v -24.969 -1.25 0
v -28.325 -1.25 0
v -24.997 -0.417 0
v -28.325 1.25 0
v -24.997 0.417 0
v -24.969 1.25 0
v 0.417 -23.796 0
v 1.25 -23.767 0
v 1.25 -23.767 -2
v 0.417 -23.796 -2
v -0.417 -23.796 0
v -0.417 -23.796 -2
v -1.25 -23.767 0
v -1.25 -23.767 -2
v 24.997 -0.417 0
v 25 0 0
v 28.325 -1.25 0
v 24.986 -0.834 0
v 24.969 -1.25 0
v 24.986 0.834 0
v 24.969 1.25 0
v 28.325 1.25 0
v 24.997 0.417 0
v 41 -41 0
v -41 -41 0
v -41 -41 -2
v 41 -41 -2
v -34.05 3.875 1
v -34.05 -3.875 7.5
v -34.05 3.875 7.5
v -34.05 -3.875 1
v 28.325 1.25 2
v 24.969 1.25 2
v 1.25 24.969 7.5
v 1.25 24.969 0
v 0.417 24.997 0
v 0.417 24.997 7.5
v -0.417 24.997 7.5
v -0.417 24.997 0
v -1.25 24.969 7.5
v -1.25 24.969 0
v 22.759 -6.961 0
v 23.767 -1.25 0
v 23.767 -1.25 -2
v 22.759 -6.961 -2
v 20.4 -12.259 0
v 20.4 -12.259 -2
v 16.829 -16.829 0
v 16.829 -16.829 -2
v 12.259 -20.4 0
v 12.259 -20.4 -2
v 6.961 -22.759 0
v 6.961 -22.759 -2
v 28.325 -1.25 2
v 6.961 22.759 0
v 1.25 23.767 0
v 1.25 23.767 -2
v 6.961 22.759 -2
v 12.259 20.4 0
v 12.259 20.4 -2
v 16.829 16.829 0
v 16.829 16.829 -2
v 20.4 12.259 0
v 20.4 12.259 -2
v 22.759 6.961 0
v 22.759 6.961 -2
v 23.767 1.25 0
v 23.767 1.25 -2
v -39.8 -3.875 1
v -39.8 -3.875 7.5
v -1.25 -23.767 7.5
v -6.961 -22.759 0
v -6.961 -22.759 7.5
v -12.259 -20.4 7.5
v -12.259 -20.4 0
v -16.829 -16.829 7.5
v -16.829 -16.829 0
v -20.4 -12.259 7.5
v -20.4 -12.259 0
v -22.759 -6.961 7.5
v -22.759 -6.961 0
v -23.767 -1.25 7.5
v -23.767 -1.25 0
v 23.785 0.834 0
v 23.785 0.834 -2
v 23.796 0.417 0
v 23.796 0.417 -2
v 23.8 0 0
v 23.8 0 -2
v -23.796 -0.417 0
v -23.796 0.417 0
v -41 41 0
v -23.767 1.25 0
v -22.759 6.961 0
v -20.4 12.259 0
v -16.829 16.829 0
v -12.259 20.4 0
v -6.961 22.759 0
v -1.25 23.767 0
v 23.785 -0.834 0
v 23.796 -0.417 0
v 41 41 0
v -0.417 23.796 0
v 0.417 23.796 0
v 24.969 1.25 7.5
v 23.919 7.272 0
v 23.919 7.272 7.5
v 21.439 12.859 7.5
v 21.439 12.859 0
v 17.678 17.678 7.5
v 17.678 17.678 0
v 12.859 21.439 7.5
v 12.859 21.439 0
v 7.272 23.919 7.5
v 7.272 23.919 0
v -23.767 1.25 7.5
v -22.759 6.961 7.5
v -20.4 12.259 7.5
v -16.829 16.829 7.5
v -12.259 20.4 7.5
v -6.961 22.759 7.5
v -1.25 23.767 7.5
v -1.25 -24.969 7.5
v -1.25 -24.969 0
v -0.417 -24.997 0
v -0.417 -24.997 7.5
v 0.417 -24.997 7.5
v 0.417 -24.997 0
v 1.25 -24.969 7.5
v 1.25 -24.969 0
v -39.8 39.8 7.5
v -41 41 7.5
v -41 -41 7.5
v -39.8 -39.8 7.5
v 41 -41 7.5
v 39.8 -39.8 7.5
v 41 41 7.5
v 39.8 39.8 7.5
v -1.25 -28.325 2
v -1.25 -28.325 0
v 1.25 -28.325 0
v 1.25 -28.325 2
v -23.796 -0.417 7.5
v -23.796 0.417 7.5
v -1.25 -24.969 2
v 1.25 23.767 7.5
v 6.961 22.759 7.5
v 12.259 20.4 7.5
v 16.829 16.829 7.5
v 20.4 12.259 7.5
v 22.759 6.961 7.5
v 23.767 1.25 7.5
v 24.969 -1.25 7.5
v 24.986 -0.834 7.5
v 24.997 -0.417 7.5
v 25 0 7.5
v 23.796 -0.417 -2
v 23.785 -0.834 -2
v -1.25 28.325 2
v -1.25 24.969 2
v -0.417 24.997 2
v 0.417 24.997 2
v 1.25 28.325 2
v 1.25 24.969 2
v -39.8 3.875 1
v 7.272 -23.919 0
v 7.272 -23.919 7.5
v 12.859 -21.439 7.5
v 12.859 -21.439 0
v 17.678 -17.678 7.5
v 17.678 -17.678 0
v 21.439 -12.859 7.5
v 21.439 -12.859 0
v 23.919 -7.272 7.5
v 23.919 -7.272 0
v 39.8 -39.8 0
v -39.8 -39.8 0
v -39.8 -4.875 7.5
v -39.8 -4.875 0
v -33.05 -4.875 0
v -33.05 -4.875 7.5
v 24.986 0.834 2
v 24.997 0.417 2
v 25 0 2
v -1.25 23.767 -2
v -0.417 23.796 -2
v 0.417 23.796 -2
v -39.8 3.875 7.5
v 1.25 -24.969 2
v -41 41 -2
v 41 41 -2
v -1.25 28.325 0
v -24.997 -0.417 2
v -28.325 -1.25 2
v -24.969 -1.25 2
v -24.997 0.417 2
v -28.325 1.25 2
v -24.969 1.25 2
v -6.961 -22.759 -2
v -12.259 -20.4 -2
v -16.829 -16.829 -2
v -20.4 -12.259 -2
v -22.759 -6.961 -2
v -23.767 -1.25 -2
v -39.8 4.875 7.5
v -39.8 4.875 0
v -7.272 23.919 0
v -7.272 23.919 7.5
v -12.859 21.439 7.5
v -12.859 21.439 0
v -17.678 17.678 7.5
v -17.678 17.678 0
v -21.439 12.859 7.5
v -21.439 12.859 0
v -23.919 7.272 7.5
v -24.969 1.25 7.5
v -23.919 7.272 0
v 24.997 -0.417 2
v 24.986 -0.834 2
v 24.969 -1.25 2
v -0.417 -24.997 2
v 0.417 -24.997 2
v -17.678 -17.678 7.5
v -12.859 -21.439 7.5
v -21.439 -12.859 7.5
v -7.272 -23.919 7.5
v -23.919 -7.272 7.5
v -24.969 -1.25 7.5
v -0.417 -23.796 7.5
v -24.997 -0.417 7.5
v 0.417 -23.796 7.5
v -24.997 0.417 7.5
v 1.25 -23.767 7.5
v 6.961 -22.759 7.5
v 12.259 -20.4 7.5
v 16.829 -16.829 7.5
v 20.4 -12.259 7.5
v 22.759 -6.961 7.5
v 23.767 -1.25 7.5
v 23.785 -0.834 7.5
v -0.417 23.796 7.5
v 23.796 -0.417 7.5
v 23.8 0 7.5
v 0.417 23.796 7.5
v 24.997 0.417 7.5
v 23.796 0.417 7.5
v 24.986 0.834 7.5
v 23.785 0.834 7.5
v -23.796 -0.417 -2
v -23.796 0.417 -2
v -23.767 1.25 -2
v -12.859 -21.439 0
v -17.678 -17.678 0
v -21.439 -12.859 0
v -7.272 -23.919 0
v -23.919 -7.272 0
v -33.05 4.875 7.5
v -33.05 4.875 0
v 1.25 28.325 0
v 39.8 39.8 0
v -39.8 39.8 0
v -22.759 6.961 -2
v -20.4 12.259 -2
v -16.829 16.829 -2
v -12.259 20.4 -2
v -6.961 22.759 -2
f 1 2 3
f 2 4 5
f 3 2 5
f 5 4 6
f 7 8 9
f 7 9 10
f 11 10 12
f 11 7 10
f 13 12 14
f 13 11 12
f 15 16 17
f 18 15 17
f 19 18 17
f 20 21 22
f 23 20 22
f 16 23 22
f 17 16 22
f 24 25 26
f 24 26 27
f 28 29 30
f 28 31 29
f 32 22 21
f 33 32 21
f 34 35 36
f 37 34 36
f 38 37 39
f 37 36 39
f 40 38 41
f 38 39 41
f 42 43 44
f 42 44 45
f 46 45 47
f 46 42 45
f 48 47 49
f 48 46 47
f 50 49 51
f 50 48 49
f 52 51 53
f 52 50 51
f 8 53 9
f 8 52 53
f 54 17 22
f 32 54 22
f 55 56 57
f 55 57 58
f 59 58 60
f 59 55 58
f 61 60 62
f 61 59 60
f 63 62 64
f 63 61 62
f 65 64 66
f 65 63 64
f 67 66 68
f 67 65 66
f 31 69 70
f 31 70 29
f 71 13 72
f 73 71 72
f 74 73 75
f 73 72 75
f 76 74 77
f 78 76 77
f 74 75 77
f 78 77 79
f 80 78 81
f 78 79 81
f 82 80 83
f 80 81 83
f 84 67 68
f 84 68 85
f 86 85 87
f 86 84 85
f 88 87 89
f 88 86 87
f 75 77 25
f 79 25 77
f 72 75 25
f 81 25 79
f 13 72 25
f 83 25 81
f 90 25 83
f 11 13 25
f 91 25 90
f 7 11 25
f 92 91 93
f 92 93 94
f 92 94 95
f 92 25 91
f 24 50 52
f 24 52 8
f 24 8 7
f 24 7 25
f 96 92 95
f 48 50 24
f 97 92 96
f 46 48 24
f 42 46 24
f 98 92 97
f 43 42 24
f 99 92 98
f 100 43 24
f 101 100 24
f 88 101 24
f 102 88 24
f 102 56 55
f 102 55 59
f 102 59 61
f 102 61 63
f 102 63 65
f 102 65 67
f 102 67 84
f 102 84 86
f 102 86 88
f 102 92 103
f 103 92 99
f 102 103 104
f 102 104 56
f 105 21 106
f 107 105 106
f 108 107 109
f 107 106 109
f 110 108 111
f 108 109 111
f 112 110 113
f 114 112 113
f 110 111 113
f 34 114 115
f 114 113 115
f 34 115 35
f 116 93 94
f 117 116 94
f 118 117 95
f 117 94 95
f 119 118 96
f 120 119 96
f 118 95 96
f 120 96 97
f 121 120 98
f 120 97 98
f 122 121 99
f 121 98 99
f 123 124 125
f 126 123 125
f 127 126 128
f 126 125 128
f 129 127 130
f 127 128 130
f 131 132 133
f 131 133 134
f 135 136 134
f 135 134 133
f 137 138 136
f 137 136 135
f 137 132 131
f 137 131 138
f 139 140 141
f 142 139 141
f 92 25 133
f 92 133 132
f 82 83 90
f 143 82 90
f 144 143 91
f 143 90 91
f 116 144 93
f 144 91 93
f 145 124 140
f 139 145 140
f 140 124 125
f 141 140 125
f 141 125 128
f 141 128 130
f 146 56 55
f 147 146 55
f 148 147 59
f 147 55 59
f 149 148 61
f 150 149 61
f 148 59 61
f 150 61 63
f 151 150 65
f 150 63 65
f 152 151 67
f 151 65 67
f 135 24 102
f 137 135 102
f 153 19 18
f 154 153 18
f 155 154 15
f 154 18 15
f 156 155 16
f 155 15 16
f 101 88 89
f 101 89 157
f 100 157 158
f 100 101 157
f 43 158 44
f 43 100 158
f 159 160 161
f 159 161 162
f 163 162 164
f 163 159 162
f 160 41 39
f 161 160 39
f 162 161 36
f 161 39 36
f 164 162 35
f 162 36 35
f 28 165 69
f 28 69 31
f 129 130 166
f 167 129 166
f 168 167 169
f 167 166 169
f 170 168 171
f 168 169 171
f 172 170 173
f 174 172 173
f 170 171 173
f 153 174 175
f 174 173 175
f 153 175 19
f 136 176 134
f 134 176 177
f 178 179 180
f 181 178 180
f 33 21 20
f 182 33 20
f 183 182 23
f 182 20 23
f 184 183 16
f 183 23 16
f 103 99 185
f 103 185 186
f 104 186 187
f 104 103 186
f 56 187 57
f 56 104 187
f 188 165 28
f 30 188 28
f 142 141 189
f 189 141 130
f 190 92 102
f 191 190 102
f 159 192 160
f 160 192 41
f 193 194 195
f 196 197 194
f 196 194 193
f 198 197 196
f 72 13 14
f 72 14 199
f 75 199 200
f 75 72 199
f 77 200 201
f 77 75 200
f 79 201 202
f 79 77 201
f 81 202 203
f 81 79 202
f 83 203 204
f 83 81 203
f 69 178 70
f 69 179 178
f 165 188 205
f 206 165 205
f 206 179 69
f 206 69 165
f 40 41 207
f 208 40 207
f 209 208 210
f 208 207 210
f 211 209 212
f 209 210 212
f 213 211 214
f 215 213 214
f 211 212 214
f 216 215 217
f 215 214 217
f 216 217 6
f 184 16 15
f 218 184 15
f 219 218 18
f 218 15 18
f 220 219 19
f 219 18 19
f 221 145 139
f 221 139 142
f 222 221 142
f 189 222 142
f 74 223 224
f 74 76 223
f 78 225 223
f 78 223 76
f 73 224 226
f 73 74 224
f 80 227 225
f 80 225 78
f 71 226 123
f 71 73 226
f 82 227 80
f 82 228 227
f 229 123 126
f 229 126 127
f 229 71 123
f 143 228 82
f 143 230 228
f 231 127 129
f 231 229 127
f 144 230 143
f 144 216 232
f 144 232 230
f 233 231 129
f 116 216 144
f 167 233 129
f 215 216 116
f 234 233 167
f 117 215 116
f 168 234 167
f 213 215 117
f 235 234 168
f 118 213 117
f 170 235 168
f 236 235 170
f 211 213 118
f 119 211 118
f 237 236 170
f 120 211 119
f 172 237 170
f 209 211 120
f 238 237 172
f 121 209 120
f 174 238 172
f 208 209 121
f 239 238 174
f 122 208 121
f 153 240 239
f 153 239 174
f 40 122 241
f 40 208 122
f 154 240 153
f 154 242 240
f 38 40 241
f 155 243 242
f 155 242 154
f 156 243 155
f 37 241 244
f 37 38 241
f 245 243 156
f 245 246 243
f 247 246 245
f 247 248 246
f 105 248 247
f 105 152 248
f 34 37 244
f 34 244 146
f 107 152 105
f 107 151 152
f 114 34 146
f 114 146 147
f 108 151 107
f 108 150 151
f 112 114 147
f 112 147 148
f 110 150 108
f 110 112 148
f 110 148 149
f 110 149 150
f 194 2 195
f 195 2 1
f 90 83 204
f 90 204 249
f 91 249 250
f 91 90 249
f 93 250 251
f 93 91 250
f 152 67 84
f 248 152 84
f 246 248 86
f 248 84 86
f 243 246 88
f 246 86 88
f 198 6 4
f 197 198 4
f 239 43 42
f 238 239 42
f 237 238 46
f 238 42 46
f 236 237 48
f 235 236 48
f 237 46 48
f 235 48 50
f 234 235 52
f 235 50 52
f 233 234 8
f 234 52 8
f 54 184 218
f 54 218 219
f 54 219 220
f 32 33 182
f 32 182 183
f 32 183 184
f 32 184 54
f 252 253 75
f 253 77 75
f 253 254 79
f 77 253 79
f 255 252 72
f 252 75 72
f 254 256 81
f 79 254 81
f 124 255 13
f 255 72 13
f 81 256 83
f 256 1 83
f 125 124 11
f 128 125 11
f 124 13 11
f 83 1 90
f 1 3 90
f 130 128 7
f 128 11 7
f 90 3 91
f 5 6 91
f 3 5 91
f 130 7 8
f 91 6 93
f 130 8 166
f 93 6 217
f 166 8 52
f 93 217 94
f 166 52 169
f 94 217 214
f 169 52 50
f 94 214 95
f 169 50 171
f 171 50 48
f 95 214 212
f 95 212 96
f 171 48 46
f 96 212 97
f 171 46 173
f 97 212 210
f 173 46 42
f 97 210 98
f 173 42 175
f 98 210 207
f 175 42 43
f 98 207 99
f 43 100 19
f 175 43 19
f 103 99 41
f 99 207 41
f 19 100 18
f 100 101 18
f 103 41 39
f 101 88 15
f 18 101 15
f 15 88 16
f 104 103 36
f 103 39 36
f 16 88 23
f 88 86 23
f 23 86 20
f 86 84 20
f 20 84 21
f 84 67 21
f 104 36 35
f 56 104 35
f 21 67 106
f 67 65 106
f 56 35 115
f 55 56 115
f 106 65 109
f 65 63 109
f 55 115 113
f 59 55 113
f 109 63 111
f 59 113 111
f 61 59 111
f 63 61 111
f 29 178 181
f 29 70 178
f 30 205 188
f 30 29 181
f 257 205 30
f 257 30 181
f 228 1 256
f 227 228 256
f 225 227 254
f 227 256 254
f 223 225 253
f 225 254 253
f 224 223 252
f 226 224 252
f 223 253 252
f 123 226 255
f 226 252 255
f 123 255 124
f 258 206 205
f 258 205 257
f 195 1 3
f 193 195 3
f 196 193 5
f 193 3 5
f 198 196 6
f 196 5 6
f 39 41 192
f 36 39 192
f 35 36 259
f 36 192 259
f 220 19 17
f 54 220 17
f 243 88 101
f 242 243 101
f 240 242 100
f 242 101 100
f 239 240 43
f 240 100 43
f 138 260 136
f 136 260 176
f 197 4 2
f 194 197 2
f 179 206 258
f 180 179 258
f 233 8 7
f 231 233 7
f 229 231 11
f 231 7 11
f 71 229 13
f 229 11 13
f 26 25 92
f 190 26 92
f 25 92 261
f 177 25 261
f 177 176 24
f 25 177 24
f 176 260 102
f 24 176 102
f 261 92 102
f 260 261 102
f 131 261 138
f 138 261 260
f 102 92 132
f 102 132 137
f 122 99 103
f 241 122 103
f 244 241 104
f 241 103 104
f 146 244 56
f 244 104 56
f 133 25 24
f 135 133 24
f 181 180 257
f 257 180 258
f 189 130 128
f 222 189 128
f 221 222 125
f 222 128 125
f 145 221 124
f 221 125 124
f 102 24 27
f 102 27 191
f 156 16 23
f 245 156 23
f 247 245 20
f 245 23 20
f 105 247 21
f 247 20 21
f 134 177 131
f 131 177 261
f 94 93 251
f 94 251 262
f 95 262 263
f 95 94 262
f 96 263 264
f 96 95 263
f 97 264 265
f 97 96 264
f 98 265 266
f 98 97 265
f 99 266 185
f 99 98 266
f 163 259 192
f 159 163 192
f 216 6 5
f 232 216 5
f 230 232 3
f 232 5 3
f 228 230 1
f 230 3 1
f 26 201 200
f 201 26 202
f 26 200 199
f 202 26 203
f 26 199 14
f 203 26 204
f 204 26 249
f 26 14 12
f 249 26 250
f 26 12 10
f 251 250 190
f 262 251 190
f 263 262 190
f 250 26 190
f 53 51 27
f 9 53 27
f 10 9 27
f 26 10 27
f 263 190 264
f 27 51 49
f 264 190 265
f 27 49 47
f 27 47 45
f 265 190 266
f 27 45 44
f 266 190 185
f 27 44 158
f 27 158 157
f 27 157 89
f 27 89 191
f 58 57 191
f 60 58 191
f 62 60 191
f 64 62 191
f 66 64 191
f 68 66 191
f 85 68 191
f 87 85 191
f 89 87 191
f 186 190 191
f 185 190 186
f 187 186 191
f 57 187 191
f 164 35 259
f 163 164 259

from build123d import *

# Parameters (mm, degrees)
F1_DEPTH = 7.5
F0_W     = 82
F0_H     = 82
F0_R     = 32.8
F0_W_2   = 6.75
F0_H_2   = 9.75
F2_DEPTH = 2
F3_DEPTH = 2
F4_DEPTH = 7.5
F5_T     = -1


# Not quite as in the source:
# - a feature names something its author has since deleted; it is built from what else it names


with BuildPart() as f1:
    # F0 (on Top) → F1 (new body)
    with BuildSketch(Plane.XY):
        with BuildLine():
            ThreePointArc((-24.9687304443, -1.25), (-17.6776695297, -17.6776695297), (-1.25, -24.9687304443))
            Line((-1.25, -24.9687304443), (-1.25, -23.7671517015))
            ThreePointArc((-1.25, -23.7671517015), (-16.8291413922, -16.8291413922), (-23.7671517015, -1.25))
            Line((-23.7671517015, -1.25), (-24.9687304443, -1.25))
        make_face()
        with BuildLine():
            Line((-1.25, 23.7671517015), (-1.25, 24.9687304443))
            ThreePointArc((-1.25, 24.9687304443), (-17.6776695297, 17.6776695297), (-24.9687304443, 1.25))
            Line((-24.9687304443, 1.25), (-23.7671517015, 1.25))
            ThreePointArc((-23.7671517015, 1.25), (-16.8291413922, 16.8291413922), (-1.25, 23.7671517015))
        make_face()
        with BuildLine():
            Line((23.7671517015, 1.25), (24.9687304443, 1.25))
            ThreePointArc((24.9687304443, 1.25), (17.6776695297, 17.6776695297), (1.25, 24.9687304443))
            Line((1.25, 24.9687304443), (1.25, 23.7671517015))
            ThreePointArc((1.25, 23.7671517015), (16.8291413922, 16.8291413922), (23.7671517015, 1.25))
        make_face()
        with BuildLine():
            ThreePointArc((1.25, -24.9687304443), (17.6776695297, -17.6776695297), (24.9687304443, -1.25))
            Line((24.9687304443, -1.25), (23.7671517015, -1.25))
            ThreePointArc((23.7671517015, -1.25), (16.8291413922, -16.8291413922), (1.25, -23.7671517015))
            Line((1.25, -23.7671517015), (1.25, -24.9687304443))
        make_face()
        with BuildLine():
            Line((1.25, 23.7671517015), (1.25, 24.9687304443))
            ThreePointArc((1.25, 24.9687304443), (0, 25), (-1.25, 24.9687304443))
            Line((-1.25, 24.9687304443), (-1.25, 23.7671517015))
            ThreePointArc((-1.25, 23.7671517015), (0, 23.8), (1.25, 23.7671517015))
        make_face()
        with BuildLine():
            ThreePointArc((-1.25, -24.9687304443), (0, -25), (1.25, -24.9687304443))
            Line((1.25, -24.9687304443), (1.25, -23.7671517015))
            ThreePointArc((1.25, -23.7671517015), (0, -23.8), (-1.25, -23.7671517015))
            Line((-1.25, -23.7671517015), (-1.25, -24.9687304443))
        make_face()
        with BuildLine():
            ThreePointArc((24.9687304443, -1.25), (24.9921813885, -0.6251955264), (25, 0))
            ThreePointArc((25, 0), (24.9921813885, 0.6251955264), (24.9687304443, 1.25))
            Line((24.9687304443, 1.25), (23.7671517015, 1.25))
            ThreePointArc((23.7671517015, 1.25), (23.7917865081, 0.6252157649), (23.8, 0))
            ThreePointArc((23.8, 0), (23.7917865081, -0.6252157649), (23.7671517015, -1.25))
            Line((23.7671517015, -1.25), (24.9687304443, -1.25))
        make_face()
        with BuildLine():
            Line((-23.7671517015, 1.25), (-24.9687304443, 1.25))
            ThreePointArc((-24.9687304443, 1.25), (-25, 0), (-24.9687304443, -1.25))
            Line((-24.9687304443, -1.25), (-23.7671517015, -1.25))
            ThreePointArc((-23.7671517015, -1.25), (-23.8, 0), (-23.7671517015, 1.25))
        make_face()
    extrude(amount=F1_DEPTH)


with BuildPart() as f1b:
    # F0 (on Top) → F1, piece 2 (new body)
    with BuildSketch(Plane.XY):
        Rectangle(F0_W, F0_H)
        Polygon((-39.8, 4.875), (-39.8, 39.8), (39.8, 39.8), (39.8, -39.8), (-39.8, -39.8), (-39.8, -4.875), align=None, mode=Mode.SUBTRACT)
    extrude(amount=F1_DEPTH)


with BuildPart() as f2:
    # F0 (on Top) → F2 (new body)
    with BuildSketch(Plane.XY):
        Rectangle(F0_W, F0_H)
        Polygon((-39.8, 4.875), (-39.8, 39.8), (39.8, 39.8), (39.8, -39.8), (-39.8, -39.8), (-39.8, -4.875), align=None, mode=Mode.SUBTRACT)
        Polygon((39.8, 39.8), (-39.8, 39.8), (-39.8, 4.875), (-33.05, 4.875), (-33.05, -4.875), (-39.8, -4.875), (-39.8, -39.8), (39.8, -39.8), align=None)
        Circle(F0_R, mode=Mode.SUBTRACT)
        Circle(F0_R)
        with BuildLine():
            ThreePointArc((1.25, 24.9687304443), (17.6776695297, 17.6776695297), (24.9687304443, 1.25))
            Line((24.9687304443, 1.25), (28.325, 1.25))
            Line((28.325, 1.25), (28.325, -1.25))
            Line((28.325, -1.25), (24.9687304443, -1.25))
            ThreePointArc((24.9687304443, -1.25), (17.6776695297, -17.6776695297), (1.25, -24.9687304443))
            Line((1.25, -24.9687304443), (1.25, -28.325))
            Line((1.25, -28.325), (-1.25, -28.325))
            Line((-1.25, -28.325), (-1.25, -24.9687304443))
            ThreePointArc((-1.25, -24.9687304443), (-17.6776695297, -17.6776695297), (-24.9687304443, -1.25))
            Line((-24.9687304443, -1.25), (-28.325, -1.25))
            Line((-28.325, -1.25), (-28.325, 1.25))
            Line((-28.325, 1.25), (-24.9687304443, 1.25))
            ThreePointArc((-24.9687304443, 1.25), (-17.6776695297, 17.6776695297), (-1.25, 24.9687304443))
            Line((-1.25, 24.9687304443), (-1.25, 28.325))
            Line((-1.25, 28.325), (1.25, 28.325))
            Line((1.25, 28.325), (1.25, 24.9687304443))
        make_face(mode=Mode.SUBTRACT)
        with Locations((-36.425, 0)):
            Rectangle(F0_W_2, F0_H_2)
        with BuildLine():
            Line((23.7671517015, 1.25), (24.9687304443, 1.25))
            ThreePointArc((24.9687304443, 1.25), (17.6776695297, 17.6776695297), (1.25, 24.9687304443))
            Line((1.25, 24.9687304443), (1.25, 23.7671517015))
            ThreePointArc((1.25, 23.7671517015), (16.8291413922, 16.8291413922), (23.7671517015, 1.25))
        make_face()
        with BuildLine():
            Line((-1.25, 23.7671517015), (-1.25, 24.9687304443))
            ThreePointArc((-1.25, 24.9687304443), (-17.6776695297, 17.6776695297), (-24.9687304443, 1.25))
            Line((-24.9687304443, 1.25), (-23.7671517015, 1.25))
            ThreePointArc((-23.7671517015, 1.25), (-16.8291413922, 16.8291413922), (-1.25, 23.7671517015))
        make_face()
        with BuildLine():
            ThreePointArc((-24.9687304443, -1.25), (-17.6776695297, -17.6776695297), (-1.25, -24.9687304443))
            Line((-1.25, -24.9687304443), (-1.25, -23.7671517015))
            ThreePointArc((-1.25, -23.7671517015), (-16.8291413922, -16.8291413922), (-23.7671517015, -1.25))
            Line((-23.7671517015, -1.25), (-24.9687304443, -1.25))
        make_face()
        with BuildLine():
            ThreePointArc((1.25, -24.9687304443), (17.6776695297, -17.6776695297), (24.9687304443, -1.25))
            Line((24.9687304443, -1.25), (23.7671517015, -1.25))
            ThreePointArc((23.7671517015, -1.25), (16.8291413922, -16.8291413922), (1.25, -23.7671517015))
            Line((1.25, -23.7671517015), (1.25, -24.9687304443))
        make_face()
        with BuildLine():
            ThreePointArc((-24.9687304443, -1.25), (-25, 0), (-24.9687304443, 1.25))
            Line((-24.9687304443, 1.25), (-28.325, 1.25))
            Line((-28.325, 1.25), (-28.325, -1.25))
            Line((-28.325, -1.25), (-24.9687304443, -1.25))
        make_face()
        with BuildLine():
            Line((1.25, -28.325), (1.25, -24.9687304443))
            ThreePointArc((1.25, -24.9687304443), (0, -25), (-1.25, -24.9687304443))
            Line((-1.25, -24.9687304443), (-1.25, -28.325))
            Line((-1.25, -28.325), (1.25, -28.325))
        make_face()
        with BuildLine():
            ThreePointArc((-1.25, 24.9687304443), (0, 25), (1.25, 24.9687304443))
            Line((1.25, 24.9687304443), (1.25, 28.325))
            Line((1.25, 28.325), (-1.25, 28.325))
            Line((-1.25, 28.325), (-1.25, 24.9687304443))
        make_face()
        with BuildLine():
            ThreePointArc((24.9687304443, 1.25), (24.9921813885, 0.6251955264), (25, 0))
            ThreePointArc((25, 0), (24.9921813885, -0.6251955264), (24.9687304443, -1.25))
            Line((24.9687304443, -1.25), (28.325, -1.25))
            Line((28.325, -1.25), (28.325, 1.25))
            Line((28.325, 1.25), (24.9687304443, 1.25))
        make_face()
        with BuildLine():
            Line((1.25, 23.7671517015), (1.25, 24.9687304443))
            ThreePointArc((1.25, 24.9687304443), (0, 25), (-1.25, 24.9687304443))
            Line((-1.25, 24.9687304443), (-1.25, 23.7671517015))
            ThreePointArc((-1.25, 23.7671517015), (0, 23.8), (1.25, 23.7671517015))
        make_face()
        with BuildLine():
            Line((-23.7671517015, 1.25), (-24.9687304443, 1.25))
            ThreePointArc((-24.9687304443, 1.25), (-25, 0), (-24.9687304443, -1.25))
            Line((-24.9687304443, -1.25), (-23.7671517015, -1.25))
            ThreePointArc((-23.7671517015, -1.25), (-23.8, 0), (-23.7671517015, 1.25))
        make_face()
        with BuildLine():
            ThreePointArc((-1.25, -24.9687304443), (0, -25), (1.25, -24.9687304443))
            Line((1.25, -24.9687304443), (1.25, -23.7671517015))
            ThreePointArc((1.25, -23.7671517015), (0, -23.8), (-1.25, -23.7671517015))
            Line((-1.25, -23.7671517015), (-1.25, -24.9687304443))
        make_face()
        with BuildLine():
            ThreePointArc((24.9687304443, -1.25), (24.9921813885, -0.6251955264), (25, 0))
            ThreePointArc((25, 0), (24.9921813885, 0.6251955264), (24.9687304443, 1.25))
            Line((24.9687304443, 1.25), (23.7671517015, 1.25))
            ThreePointArc((23.7671517015, 1.25), (23.7917865081, 0.6252157649), (23.8, 0))
            ThreePointArc((23.8, 0), (23.7917865081, -0.6252157649), (23.7671517015, -1.25))
            Line((23.7671517015, -1.25), (24.9687304443, -1.25))
        make_face()
    extrude(amount=-F2_DEPTH)


with BuildPart() as f3:
    # F0 (on Top) → F3 (new body)
    with BuildSketch(Plane.XY):
        with BuildLine():
            ThreePointArc((-24.9687304443, -1.25), (-25, 0), (-24.9687304443, 1.25))
            Line((-24.9687304443, 1.25), (-28.325, 1.25))
            Line((-28.325, 1.25), (-28.325, -1.25))
            Line((-28.325, -1.25), (-24.9687304443, -1.25))
        make_face()
    extrude(amount=F3_DEPTH)


with BuildPart() as f3b:
    # F0 (on Top) → F3, piece 2 (new body)
    with BuildSketch(Plane.XY):
        with BuildLine():
            ThreePointArc((-1.25, 24.9687304443), (0, 25), (1.25, 24.9687304443))
            Line((1.25, 24.9687304443), (1.25, 28.325))
            Line((1.25, 28.325), (-1.25, 28.325))
            Line((-1.25, 28.325), (-1.25, 24.9687304443))
        make_face()
    extrude(amount=F3_DEPTH)


with BuildPart() as f3c:
    # F0 (on Top) → F3, piece 3 (new body)
    with BuildSketch(Plane.XY):
        with BuildLine():
            ThreePointArc((24.9687304443, 1.25), (24.9921813885, 0.6251955264), (25, 0))
            ThreePointArc((25, 0), (24.9921813885, -0.6251955264), (24.9687304443, -1.25))
            Line((24.9687304443, -1.25), (28.325, -1.25))
            Line((28.325, -1.25), (28.325, 1.25))
            Line((28.325, 1.25), (24.9687304443, 1.25))
        make_face()
    extrude(amount=F3_DEPTH)


with BuildPart() as f3d:
    # F0 (on Top) → F3, piece 4 (new body)
    with BuildSketch(Plane.XY):
        with BuildLine():
            Line((1.25, -28.325), (1.25, -24.9687304443))
            ThreePointArc((1.25, -24.9687304443), (0, -25), (-1.25, -24.9687304443))
            Line((-1.25, -24.9687304443), (-1.25, -28.325))
            Line((-1.25, -28.325), (1.25, -28.325))
        make_face()
    extrude(amount=F3_DEPTH)


with BuildPart() as f4:
    # F0 (on Top) → F4 (new body)
    with BuildSketch(Plane.XY):
        with Locations((-36.425, 0)):
            Rectangle(F0_W_2, F0_H_2)
    extrude(amount=F4_DEPTH)

    # F5
    f5_openings = [f4.faces().sort_by_distance(p)[0] for p in [
        (-39.8, 0, 3.75),
        (-36.425, 0, 7.5),
    ]]
    offset(amount=F5_T, openings=f5_openings)


solid = Compound([f1.part, f1b.part, f2.part, f3.part, f3b.part, f3c.part, f3d.part, f4.part])
